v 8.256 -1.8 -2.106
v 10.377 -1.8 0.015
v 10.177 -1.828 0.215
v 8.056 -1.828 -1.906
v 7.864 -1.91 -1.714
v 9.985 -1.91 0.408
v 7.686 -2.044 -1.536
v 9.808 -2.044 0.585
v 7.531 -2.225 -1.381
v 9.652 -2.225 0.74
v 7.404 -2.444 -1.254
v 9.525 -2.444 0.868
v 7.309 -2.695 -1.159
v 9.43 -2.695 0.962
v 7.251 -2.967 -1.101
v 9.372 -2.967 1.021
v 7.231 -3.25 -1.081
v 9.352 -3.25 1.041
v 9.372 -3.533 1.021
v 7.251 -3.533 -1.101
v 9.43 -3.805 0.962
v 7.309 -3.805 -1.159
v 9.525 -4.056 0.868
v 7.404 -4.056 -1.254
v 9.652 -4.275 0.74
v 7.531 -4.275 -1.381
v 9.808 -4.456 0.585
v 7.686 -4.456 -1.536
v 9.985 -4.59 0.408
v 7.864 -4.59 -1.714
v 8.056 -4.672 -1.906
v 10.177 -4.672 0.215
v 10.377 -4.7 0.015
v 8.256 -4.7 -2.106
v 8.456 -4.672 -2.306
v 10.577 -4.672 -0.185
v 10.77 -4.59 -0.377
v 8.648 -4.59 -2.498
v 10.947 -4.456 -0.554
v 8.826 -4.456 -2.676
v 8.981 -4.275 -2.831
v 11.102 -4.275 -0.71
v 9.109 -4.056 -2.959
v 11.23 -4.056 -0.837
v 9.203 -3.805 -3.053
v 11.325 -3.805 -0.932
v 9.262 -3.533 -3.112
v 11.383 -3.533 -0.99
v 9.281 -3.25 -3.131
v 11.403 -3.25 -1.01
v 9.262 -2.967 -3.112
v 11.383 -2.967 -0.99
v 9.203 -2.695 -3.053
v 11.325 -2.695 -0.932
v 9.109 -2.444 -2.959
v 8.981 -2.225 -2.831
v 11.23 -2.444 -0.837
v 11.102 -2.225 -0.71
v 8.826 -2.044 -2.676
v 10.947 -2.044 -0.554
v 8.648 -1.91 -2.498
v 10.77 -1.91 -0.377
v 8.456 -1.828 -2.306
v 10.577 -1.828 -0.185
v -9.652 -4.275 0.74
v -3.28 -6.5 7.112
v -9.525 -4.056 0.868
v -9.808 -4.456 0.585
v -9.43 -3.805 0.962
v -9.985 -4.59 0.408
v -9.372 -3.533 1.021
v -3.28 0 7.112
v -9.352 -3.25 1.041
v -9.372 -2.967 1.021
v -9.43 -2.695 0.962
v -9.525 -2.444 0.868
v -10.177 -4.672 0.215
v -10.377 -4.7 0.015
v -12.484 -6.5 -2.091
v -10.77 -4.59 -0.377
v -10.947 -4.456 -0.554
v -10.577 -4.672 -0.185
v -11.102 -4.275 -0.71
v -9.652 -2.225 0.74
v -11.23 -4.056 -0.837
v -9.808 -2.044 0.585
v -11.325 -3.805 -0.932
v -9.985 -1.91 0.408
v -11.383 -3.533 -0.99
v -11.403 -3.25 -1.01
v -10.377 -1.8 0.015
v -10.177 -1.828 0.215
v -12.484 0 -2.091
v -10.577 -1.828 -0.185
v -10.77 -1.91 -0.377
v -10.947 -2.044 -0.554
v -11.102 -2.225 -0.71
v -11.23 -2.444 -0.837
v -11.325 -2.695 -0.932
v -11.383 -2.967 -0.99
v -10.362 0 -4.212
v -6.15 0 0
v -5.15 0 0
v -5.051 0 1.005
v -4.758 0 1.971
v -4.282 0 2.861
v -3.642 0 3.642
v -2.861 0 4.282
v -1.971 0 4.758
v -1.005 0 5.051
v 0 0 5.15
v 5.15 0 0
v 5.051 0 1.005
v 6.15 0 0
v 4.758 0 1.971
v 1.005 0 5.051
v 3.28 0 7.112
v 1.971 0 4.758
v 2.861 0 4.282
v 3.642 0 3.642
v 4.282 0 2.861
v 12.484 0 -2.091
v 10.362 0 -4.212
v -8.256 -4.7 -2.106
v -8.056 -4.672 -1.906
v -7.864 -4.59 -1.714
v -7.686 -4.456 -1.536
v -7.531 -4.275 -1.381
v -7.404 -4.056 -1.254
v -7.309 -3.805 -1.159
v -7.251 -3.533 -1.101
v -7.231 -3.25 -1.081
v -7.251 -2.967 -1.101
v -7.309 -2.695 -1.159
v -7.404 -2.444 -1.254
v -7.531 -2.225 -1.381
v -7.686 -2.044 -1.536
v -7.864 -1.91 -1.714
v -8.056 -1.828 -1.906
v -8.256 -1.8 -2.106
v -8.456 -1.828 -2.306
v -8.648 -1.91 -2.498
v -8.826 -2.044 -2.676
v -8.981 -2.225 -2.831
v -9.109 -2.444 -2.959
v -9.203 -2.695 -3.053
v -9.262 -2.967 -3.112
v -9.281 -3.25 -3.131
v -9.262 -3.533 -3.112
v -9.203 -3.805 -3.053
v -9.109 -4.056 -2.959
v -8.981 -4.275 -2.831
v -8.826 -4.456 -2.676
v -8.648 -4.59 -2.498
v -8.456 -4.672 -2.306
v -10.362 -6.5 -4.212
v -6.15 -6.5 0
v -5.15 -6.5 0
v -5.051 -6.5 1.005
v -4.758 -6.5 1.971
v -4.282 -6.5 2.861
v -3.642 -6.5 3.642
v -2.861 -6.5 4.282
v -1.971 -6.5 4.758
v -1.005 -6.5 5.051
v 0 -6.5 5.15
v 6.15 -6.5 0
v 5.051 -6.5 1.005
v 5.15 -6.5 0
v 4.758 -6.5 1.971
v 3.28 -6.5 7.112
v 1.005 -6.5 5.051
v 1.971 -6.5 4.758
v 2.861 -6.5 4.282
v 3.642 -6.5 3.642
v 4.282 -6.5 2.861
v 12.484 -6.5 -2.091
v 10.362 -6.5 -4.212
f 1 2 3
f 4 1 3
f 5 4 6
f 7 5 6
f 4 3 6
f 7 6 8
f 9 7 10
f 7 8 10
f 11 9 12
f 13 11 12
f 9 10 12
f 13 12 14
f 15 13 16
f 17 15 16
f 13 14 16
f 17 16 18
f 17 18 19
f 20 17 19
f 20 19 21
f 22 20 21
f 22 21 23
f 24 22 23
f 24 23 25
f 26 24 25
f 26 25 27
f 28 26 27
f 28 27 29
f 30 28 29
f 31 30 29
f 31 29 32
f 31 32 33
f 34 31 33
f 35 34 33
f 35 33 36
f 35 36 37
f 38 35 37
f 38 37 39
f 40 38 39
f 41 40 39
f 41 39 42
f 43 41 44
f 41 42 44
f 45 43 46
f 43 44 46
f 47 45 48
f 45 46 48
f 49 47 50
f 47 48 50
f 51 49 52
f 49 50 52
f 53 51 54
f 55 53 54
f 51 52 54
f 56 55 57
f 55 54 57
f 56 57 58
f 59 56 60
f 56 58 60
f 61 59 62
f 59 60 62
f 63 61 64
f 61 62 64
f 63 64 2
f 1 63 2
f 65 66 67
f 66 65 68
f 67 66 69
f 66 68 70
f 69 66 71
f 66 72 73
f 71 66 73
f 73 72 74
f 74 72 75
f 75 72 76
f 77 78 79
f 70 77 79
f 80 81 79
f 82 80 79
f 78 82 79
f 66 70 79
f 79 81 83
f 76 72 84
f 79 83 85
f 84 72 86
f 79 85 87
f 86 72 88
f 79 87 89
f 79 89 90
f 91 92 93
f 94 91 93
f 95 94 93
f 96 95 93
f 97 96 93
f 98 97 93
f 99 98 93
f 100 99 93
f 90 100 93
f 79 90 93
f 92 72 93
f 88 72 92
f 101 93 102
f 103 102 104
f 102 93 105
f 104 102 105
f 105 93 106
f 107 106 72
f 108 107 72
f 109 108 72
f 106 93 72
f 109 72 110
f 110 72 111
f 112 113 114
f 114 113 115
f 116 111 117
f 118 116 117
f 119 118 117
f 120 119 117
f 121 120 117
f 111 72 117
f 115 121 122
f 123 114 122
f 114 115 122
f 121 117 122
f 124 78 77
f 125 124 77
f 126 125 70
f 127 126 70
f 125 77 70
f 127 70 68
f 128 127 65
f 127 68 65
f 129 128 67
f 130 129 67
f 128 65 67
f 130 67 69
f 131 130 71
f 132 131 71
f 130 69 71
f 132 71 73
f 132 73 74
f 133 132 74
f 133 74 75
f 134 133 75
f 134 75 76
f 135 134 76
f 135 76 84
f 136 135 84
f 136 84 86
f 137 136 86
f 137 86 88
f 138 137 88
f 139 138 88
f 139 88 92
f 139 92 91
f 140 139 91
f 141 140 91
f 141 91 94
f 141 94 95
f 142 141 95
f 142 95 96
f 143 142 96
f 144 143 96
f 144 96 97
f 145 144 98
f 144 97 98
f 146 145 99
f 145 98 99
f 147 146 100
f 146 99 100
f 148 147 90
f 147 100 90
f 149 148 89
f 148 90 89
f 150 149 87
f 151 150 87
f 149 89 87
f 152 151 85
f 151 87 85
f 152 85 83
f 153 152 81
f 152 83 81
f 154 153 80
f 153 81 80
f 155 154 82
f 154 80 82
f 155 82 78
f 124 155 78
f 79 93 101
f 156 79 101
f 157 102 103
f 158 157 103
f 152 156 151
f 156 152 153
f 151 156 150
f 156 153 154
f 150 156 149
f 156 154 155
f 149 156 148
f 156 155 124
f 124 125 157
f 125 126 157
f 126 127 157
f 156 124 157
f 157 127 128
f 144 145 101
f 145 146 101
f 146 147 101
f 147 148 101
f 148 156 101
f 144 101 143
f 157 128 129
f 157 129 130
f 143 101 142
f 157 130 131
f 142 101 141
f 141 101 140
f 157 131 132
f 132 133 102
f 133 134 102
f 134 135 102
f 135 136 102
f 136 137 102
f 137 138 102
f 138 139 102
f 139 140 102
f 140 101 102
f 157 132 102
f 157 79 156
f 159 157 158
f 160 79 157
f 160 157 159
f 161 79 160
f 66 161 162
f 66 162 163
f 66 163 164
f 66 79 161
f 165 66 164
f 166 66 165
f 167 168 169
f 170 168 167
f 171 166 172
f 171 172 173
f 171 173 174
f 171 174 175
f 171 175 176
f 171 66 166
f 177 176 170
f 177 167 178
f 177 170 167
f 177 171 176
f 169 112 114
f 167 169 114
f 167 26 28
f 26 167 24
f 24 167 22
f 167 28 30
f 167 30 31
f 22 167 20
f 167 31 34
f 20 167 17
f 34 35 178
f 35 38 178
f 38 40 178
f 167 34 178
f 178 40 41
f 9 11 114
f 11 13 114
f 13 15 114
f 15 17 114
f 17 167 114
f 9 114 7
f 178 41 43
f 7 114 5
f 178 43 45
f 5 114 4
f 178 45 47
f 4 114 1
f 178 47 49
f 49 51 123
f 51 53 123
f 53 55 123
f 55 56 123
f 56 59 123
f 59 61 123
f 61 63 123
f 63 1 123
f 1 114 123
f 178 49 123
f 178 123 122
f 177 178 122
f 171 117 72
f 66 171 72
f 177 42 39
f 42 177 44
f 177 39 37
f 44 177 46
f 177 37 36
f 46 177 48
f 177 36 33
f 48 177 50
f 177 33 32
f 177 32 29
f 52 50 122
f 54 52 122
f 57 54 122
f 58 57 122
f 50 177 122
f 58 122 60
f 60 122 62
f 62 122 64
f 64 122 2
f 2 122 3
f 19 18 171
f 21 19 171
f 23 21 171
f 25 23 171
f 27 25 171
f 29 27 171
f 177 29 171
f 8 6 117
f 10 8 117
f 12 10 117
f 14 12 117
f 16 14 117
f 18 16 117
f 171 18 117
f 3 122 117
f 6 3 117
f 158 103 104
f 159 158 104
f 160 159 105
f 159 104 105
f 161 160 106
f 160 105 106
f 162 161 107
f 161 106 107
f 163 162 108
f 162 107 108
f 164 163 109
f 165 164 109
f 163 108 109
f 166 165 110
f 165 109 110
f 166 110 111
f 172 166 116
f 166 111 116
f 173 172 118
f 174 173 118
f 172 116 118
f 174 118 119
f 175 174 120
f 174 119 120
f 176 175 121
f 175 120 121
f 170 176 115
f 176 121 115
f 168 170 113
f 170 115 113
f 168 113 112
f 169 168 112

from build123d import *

# Parameters (mm, degrees)
F1_DEPTH = 6.5
F2_R     = 1.45
F3_DEPTH = 25
F4_R     = 1.45
F5_DEPTH = 25


with BuildPart() as f1:
    # F0 (on Front) → F1 (new body)
    with BuildSketch(Plane.XZ):
        with BuildLine():
            ThreePointArc((-5.15, 0), (0, 5.15), (5.15, 0))
            Line((5.15, 0), (6.15, 0))
            Line((6.15, 0), (10.362235, -4.212235))
            Line((10.362235, -4.212235), (12.483555, -2.090915))
            Line((12.483555, -2.090915), (3.280338, 7.112302))
            Line((3.280338, 7.112302), (-3.280338, 7.112302))
            Line((-3.280338, 7.112302), (-12.483555, -2.090915))
            Line((-12.483555, -2.090915), (-10.362235, -4.212235))
            Line((-10.362235, -4.212235), (-6.15, 0))
            Line((-6.15, 0), (-5.15, 0))
        make_face()
    extrude(amount=F1_DEPTH)

    # F2 (on face) → F3 (cut)
    with BuildSketch(Plane(origin=(-5.19632, 0, 5.19632), x_dir=(0, -1, 0), z_dir=(-0.707107, 0, 0.707107))):
        with Locations((3.25, -7.327207)):
            Circle(F2_R)
    extrude(amount=-F3_DEPTH, mode=Mode.SUBTRACT)

    # F4 (on face) → F5 (cut)
    with BuildSketch(Plane(origin=(5.19632, 0, 5.19632), x_dir=(0, 1, 0), z_dir=(0.707107, 0, 0.707107))):
        with Locations((-3.25, -7.327207)):
            Circle(F4_R)
    extrude(amount=-F5_DEPTH, mode=Mode.SUBTRACT)


solid = f1.part
